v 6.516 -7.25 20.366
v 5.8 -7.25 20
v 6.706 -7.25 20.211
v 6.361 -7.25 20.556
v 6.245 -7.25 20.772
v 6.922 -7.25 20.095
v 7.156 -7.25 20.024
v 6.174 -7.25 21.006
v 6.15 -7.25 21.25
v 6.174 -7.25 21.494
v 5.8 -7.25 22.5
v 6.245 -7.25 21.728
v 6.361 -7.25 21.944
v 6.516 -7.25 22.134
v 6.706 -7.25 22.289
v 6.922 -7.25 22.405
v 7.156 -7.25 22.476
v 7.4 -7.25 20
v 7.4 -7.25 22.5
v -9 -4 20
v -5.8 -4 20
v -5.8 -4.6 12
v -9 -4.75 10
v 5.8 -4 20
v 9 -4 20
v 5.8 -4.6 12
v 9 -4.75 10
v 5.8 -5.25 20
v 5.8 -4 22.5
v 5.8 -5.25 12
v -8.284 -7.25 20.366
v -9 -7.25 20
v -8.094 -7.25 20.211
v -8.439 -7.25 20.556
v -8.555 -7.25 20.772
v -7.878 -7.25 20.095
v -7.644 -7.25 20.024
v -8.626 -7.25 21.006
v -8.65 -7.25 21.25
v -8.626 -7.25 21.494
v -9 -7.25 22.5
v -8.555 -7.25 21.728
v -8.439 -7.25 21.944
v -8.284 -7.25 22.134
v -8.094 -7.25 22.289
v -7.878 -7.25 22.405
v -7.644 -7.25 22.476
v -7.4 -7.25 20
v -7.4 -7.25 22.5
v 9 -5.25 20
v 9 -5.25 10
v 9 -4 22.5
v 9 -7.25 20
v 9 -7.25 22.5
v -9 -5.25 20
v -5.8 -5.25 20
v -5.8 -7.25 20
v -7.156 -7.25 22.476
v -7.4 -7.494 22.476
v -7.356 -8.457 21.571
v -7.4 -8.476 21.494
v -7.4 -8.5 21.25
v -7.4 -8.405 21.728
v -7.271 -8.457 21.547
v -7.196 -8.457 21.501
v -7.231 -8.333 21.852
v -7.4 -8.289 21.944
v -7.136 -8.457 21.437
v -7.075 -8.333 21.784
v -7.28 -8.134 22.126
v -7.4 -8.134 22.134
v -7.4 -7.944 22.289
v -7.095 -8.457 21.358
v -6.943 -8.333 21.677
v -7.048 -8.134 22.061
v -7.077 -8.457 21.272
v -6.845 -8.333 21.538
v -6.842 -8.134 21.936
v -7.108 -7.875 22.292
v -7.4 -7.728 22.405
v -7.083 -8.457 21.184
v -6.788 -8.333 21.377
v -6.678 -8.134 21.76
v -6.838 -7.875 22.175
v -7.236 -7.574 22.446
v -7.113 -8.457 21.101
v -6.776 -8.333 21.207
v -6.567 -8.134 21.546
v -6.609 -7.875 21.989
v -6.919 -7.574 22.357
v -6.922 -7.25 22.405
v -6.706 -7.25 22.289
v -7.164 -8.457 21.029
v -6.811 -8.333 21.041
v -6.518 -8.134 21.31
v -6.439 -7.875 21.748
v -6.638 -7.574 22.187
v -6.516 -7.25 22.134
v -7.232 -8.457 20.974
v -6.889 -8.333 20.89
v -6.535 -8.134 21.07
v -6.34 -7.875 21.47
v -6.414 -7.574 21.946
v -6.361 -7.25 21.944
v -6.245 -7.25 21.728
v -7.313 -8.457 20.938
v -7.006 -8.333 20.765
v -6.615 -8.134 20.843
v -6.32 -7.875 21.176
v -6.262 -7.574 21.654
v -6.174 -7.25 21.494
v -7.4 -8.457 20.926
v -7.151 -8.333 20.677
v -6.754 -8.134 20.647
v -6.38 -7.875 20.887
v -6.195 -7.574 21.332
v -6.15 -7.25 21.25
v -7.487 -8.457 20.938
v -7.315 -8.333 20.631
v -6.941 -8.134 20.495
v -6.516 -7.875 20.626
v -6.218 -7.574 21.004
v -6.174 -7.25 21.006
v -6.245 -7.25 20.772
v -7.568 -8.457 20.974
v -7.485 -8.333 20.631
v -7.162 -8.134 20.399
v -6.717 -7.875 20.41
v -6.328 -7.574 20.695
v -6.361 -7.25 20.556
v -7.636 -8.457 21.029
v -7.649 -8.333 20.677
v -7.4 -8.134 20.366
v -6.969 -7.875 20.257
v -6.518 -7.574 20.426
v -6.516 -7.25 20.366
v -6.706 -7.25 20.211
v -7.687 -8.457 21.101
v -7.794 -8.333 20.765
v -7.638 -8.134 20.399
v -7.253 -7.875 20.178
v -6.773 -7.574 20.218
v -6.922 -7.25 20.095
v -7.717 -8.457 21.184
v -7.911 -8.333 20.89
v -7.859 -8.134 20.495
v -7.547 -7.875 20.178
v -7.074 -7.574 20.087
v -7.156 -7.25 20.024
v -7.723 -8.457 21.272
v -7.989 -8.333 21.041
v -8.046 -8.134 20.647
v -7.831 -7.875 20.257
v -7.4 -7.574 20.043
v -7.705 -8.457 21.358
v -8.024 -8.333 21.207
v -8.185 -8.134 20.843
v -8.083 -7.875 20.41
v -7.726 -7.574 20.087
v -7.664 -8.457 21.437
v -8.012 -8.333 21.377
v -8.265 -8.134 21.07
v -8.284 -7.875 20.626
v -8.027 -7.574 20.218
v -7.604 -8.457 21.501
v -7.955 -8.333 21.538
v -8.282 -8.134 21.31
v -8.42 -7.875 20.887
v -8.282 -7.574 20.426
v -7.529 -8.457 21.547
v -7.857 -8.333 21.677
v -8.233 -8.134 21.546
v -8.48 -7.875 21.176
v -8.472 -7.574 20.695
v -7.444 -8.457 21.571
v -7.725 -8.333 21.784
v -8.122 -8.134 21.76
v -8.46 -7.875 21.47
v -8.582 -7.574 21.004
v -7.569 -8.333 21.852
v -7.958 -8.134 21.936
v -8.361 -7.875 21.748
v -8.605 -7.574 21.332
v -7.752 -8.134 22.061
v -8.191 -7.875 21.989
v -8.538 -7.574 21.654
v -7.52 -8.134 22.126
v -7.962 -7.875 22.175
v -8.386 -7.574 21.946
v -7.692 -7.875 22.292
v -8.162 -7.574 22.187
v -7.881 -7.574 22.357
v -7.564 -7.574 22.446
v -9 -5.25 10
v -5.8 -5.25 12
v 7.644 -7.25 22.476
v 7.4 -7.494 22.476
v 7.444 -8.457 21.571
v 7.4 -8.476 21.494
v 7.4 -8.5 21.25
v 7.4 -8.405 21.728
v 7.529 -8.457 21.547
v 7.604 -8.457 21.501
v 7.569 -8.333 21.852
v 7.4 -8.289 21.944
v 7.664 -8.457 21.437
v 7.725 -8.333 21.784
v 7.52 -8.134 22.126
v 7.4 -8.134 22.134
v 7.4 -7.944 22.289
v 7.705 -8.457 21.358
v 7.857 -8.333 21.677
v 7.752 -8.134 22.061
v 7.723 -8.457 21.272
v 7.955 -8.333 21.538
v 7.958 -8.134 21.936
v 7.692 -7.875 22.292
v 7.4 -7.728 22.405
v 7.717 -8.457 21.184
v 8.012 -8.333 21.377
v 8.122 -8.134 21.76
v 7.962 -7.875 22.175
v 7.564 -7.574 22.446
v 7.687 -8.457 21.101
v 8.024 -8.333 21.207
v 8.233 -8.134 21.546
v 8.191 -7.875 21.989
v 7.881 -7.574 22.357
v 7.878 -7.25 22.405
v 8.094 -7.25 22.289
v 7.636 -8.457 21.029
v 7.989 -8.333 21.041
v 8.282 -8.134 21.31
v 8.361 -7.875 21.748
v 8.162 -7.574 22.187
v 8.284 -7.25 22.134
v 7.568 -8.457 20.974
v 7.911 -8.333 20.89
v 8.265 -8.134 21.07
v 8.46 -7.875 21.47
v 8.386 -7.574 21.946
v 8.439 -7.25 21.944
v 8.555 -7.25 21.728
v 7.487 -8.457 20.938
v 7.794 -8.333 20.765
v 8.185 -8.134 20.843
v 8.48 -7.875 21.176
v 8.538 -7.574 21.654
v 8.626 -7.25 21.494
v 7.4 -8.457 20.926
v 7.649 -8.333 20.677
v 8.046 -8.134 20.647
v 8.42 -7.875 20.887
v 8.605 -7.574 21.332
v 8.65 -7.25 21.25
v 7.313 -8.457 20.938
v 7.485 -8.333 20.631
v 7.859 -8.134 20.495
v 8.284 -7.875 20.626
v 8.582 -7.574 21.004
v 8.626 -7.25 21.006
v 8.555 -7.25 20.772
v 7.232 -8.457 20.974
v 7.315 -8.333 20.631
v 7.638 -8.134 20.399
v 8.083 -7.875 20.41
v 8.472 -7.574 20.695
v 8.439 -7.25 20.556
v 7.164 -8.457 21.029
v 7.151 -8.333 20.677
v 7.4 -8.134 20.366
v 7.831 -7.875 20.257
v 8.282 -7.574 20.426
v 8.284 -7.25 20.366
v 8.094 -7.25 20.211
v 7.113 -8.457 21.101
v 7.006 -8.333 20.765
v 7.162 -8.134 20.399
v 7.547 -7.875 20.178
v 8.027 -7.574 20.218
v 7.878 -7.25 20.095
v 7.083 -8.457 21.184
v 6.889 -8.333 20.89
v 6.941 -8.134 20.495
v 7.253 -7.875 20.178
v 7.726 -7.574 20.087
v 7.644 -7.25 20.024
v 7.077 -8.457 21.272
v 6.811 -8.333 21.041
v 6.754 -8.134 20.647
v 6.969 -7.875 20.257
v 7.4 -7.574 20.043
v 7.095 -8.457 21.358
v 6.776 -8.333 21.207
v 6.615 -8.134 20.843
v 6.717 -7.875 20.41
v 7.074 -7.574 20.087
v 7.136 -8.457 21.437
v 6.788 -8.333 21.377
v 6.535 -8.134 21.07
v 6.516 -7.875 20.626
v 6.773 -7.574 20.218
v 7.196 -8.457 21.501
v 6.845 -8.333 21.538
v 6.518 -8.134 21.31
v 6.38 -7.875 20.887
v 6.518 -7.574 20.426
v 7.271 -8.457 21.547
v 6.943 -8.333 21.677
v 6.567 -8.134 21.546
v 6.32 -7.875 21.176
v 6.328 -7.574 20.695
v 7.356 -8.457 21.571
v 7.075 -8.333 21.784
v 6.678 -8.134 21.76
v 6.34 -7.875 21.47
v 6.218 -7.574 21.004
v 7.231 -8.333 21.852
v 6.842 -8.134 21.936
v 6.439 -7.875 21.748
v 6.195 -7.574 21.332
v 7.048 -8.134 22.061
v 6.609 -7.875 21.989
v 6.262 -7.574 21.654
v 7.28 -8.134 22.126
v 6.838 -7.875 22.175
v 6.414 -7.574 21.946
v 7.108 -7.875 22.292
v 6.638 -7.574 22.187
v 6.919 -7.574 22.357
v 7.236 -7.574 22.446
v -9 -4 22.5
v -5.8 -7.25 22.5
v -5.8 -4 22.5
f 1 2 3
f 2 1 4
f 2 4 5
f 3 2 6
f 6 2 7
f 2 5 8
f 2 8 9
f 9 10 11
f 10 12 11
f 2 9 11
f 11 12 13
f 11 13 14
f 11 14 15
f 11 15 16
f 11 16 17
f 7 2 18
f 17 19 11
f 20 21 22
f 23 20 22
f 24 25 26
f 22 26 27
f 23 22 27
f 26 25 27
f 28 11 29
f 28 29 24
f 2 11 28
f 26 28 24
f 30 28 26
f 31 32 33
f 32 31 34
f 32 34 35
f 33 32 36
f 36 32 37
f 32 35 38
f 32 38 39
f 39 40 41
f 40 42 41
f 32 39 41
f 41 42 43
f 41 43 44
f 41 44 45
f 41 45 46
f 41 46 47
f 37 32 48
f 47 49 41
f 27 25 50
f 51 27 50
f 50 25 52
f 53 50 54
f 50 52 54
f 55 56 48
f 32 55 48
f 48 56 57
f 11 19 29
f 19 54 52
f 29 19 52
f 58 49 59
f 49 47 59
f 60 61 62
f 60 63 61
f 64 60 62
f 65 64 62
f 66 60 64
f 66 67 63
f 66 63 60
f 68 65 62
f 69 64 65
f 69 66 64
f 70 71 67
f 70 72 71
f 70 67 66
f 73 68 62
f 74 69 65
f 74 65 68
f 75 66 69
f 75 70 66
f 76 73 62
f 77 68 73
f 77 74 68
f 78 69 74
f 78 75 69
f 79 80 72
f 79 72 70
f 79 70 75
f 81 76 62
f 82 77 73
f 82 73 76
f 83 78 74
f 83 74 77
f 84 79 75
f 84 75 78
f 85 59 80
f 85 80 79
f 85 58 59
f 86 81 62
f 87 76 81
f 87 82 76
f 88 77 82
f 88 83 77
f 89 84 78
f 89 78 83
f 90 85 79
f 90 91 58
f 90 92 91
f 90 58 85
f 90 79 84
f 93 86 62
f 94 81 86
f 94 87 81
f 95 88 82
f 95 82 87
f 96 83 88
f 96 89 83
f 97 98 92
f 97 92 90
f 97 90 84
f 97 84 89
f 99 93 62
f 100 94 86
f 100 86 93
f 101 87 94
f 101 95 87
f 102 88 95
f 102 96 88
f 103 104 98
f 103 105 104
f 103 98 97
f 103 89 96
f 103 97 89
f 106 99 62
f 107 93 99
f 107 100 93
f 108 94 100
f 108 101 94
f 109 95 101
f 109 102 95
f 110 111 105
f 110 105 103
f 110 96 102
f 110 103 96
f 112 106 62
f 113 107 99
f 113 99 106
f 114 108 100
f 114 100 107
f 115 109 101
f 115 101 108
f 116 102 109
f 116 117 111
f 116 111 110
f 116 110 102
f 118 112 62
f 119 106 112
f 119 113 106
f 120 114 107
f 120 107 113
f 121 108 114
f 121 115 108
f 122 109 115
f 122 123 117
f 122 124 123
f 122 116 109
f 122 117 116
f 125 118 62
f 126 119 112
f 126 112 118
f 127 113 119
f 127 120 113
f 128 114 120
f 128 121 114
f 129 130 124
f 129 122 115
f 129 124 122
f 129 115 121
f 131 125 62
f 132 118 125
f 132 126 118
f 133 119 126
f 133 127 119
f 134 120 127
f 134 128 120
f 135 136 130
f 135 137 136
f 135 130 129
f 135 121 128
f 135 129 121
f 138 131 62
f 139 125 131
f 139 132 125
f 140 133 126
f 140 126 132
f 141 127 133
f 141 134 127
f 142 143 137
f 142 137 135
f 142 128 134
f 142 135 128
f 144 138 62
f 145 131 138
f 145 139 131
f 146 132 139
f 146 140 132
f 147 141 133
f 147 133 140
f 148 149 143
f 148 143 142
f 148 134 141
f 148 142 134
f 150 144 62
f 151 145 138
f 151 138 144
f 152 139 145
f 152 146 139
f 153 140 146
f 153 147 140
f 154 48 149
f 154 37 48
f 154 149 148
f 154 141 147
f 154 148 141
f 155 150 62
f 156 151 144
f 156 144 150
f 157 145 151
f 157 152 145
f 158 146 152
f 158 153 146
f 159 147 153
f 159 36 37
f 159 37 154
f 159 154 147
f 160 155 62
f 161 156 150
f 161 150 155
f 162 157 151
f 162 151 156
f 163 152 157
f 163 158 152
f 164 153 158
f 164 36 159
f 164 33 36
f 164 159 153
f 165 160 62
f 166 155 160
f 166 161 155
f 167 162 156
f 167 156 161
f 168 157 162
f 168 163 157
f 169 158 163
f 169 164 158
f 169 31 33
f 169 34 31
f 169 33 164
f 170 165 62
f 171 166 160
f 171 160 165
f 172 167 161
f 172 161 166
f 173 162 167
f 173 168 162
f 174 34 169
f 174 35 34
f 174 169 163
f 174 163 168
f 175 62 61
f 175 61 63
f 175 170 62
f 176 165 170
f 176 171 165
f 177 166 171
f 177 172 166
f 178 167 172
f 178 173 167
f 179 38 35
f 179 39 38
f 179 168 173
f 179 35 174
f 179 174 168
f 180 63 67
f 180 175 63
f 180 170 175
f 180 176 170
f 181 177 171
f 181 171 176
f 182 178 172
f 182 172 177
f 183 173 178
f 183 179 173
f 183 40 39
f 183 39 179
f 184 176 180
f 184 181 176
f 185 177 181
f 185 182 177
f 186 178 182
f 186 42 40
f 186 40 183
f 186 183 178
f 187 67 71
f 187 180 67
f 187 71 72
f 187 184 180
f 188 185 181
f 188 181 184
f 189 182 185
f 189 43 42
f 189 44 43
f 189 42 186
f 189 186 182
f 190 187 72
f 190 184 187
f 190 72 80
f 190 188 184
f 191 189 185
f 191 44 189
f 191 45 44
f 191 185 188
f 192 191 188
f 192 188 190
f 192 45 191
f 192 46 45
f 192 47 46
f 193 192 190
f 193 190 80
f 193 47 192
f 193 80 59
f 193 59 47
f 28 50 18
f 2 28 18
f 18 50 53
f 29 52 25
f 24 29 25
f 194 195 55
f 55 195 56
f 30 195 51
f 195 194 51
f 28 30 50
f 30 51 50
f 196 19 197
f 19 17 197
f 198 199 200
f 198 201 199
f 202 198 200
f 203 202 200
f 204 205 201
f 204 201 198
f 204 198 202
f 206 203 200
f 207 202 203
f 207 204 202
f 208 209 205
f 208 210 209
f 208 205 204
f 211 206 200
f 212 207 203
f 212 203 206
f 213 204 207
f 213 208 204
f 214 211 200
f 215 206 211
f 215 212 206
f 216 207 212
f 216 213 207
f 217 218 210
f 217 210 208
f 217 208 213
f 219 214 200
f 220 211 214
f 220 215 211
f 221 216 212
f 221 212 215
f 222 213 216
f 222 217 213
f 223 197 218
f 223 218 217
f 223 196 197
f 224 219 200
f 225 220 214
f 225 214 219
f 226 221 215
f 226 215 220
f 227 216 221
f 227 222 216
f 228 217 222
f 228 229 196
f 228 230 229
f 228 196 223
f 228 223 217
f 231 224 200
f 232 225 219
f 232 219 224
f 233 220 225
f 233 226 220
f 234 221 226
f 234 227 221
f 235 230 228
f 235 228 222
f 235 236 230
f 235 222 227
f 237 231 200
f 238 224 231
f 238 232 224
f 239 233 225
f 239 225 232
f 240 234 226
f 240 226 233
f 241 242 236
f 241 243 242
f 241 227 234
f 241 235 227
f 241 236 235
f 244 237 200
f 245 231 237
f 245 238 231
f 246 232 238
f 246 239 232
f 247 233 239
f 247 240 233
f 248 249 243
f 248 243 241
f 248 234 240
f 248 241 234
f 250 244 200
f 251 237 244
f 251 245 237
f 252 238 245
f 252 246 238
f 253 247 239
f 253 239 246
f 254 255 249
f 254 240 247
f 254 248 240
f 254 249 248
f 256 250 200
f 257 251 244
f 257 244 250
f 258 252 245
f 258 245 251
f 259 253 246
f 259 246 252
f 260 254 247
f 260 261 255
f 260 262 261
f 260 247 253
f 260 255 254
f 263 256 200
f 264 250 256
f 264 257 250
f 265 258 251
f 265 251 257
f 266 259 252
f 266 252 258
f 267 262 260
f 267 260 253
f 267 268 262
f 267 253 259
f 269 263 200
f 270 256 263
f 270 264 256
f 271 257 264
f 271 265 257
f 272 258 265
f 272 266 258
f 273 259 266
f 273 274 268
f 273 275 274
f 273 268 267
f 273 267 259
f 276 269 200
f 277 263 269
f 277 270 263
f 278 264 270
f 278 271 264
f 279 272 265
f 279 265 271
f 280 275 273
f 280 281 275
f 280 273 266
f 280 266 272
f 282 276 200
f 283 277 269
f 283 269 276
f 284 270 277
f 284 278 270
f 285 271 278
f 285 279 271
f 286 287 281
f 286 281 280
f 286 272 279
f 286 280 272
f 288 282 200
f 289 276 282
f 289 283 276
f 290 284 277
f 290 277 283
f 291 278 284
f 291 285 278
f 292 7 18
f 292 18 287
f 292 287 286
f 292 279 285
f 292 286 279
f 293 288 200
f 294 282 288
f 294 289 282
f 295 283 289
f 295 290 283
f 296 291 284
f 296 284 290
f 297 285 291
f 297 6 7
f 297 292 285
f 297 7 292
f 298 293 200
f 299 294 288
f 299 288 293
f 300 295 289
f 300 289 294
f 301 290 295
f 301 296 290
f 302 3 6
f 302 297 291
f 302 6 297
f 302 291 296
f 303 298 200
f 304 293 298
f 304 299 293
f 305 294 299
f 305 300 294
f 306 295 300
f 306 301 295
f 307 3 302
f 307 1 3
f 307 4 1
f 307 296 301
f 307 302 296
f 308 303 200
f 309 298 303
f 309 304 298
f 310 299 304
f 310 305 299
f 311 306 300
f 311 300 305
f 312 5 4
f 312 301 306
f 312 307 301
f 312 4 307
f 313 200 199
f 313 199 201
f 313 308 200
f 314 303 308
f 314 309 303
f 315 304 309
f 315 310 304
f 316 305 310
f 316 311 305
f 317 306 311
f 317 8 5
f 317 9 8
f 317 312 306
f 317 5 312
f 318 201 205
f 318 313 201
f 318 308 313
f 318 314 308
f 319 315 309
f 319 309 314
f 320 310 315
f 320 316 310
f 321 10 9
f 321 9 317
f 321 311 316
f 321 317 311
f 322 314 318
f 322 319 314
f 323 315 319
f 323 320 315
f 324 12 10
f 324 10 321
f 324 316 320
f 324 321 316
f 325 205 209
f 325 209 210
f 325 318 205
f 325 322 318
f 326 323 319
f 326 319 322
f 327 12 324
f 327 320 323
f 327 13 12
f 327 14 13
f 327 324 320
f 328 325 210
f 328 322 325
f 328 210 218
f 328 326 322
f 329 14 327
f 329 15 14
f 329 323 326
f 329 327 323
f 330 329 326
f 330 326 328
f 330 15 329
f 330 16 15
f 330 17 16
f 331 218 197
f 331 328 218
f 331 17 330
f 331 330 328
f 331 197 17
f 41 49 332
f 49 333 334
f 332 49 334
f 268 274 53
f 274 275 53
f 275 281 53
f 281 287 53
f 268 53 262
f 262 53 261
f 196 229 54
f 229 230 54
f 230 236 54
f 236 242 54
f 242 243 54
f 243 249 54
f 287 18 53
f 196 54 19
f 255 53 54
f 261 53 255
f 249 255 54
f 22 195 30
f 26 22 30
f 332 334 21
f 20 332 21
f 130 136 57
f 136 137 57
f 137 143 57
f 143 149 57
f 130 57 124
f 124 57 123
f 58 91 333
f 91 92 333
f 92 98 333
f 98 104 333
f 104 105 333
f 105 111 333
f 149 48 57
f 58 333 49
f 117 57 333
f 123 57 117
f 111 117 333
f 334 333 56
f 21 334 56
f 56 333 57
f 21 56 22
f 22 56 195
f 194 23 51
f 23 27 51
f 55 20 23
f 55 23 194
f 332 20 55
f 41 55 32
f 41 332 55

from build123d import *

# Parameters (mm, degrees)
PAD_DEPTH    = 9
SKETCH001_W  = 10.5
SKETCH001_H  = 11.6
POCKET_DEPTH = 5


with BuildPart() as part:
    # Sketch → Pad (new body, symmetric)
    with BuildSketch(Plane.YZ):
        Polygon((-4, 22.5), (-4, 20), (-4.75, 10), (-5.25, 10), (-5.25, 20), (-7.25, 20), (-7.25, 22.5), align=None)
    extrude(amount=PAD_DEPTH, both=True)

    # Sketch001 (on Face6 of Pad) → Pocket (cut)
    with BuildSketch(Plane(origin=(0, -7.25, 0), x_dir=(0, 0, -1), z_dir=(0, -1, 0))):
        with Locations((-17.25, 0)):
            Rectangle(SKETCH001_W, SKETCH001_H)
    extrude(amount=-POCKET_DEPTH, mode=Mode.SUBTRACT)

    # Sphere → Sphere (revolve)
    with BuildSketch(Plane(origin=(7.4, -7.25, 21.25), x_dir=(0, 0, 1), z_dir=(-1, 0, 0))):
        with BuildLine():
            ThreePointArc((0, -1.25), (1.25, 0), (0, 1.25))
            Line((0, 1.25), (0, -1.25))
        make_face()
    revolve(axis=Axis((7.4, -7.25, 21.25), (0, 1, 0)))

    # Sphere001 → Sphere001 (revolve)
    with BuildSketch(Plane(origin=(-7.4, -7.25, 21.25), x_dir=(0, 0, 1), z_dir=(-1, 0, 0))):
        with BuildLine():
            ThreePointArc((0, -1.25), (1.25, 0), (0, 1.25))
            Line((0, 1.25), (0, -1.25))
        make_face()
    revolve(axis=Axis((-7.4, -7.25, 21.25), (0, 1, 0)))


solid = part.part
